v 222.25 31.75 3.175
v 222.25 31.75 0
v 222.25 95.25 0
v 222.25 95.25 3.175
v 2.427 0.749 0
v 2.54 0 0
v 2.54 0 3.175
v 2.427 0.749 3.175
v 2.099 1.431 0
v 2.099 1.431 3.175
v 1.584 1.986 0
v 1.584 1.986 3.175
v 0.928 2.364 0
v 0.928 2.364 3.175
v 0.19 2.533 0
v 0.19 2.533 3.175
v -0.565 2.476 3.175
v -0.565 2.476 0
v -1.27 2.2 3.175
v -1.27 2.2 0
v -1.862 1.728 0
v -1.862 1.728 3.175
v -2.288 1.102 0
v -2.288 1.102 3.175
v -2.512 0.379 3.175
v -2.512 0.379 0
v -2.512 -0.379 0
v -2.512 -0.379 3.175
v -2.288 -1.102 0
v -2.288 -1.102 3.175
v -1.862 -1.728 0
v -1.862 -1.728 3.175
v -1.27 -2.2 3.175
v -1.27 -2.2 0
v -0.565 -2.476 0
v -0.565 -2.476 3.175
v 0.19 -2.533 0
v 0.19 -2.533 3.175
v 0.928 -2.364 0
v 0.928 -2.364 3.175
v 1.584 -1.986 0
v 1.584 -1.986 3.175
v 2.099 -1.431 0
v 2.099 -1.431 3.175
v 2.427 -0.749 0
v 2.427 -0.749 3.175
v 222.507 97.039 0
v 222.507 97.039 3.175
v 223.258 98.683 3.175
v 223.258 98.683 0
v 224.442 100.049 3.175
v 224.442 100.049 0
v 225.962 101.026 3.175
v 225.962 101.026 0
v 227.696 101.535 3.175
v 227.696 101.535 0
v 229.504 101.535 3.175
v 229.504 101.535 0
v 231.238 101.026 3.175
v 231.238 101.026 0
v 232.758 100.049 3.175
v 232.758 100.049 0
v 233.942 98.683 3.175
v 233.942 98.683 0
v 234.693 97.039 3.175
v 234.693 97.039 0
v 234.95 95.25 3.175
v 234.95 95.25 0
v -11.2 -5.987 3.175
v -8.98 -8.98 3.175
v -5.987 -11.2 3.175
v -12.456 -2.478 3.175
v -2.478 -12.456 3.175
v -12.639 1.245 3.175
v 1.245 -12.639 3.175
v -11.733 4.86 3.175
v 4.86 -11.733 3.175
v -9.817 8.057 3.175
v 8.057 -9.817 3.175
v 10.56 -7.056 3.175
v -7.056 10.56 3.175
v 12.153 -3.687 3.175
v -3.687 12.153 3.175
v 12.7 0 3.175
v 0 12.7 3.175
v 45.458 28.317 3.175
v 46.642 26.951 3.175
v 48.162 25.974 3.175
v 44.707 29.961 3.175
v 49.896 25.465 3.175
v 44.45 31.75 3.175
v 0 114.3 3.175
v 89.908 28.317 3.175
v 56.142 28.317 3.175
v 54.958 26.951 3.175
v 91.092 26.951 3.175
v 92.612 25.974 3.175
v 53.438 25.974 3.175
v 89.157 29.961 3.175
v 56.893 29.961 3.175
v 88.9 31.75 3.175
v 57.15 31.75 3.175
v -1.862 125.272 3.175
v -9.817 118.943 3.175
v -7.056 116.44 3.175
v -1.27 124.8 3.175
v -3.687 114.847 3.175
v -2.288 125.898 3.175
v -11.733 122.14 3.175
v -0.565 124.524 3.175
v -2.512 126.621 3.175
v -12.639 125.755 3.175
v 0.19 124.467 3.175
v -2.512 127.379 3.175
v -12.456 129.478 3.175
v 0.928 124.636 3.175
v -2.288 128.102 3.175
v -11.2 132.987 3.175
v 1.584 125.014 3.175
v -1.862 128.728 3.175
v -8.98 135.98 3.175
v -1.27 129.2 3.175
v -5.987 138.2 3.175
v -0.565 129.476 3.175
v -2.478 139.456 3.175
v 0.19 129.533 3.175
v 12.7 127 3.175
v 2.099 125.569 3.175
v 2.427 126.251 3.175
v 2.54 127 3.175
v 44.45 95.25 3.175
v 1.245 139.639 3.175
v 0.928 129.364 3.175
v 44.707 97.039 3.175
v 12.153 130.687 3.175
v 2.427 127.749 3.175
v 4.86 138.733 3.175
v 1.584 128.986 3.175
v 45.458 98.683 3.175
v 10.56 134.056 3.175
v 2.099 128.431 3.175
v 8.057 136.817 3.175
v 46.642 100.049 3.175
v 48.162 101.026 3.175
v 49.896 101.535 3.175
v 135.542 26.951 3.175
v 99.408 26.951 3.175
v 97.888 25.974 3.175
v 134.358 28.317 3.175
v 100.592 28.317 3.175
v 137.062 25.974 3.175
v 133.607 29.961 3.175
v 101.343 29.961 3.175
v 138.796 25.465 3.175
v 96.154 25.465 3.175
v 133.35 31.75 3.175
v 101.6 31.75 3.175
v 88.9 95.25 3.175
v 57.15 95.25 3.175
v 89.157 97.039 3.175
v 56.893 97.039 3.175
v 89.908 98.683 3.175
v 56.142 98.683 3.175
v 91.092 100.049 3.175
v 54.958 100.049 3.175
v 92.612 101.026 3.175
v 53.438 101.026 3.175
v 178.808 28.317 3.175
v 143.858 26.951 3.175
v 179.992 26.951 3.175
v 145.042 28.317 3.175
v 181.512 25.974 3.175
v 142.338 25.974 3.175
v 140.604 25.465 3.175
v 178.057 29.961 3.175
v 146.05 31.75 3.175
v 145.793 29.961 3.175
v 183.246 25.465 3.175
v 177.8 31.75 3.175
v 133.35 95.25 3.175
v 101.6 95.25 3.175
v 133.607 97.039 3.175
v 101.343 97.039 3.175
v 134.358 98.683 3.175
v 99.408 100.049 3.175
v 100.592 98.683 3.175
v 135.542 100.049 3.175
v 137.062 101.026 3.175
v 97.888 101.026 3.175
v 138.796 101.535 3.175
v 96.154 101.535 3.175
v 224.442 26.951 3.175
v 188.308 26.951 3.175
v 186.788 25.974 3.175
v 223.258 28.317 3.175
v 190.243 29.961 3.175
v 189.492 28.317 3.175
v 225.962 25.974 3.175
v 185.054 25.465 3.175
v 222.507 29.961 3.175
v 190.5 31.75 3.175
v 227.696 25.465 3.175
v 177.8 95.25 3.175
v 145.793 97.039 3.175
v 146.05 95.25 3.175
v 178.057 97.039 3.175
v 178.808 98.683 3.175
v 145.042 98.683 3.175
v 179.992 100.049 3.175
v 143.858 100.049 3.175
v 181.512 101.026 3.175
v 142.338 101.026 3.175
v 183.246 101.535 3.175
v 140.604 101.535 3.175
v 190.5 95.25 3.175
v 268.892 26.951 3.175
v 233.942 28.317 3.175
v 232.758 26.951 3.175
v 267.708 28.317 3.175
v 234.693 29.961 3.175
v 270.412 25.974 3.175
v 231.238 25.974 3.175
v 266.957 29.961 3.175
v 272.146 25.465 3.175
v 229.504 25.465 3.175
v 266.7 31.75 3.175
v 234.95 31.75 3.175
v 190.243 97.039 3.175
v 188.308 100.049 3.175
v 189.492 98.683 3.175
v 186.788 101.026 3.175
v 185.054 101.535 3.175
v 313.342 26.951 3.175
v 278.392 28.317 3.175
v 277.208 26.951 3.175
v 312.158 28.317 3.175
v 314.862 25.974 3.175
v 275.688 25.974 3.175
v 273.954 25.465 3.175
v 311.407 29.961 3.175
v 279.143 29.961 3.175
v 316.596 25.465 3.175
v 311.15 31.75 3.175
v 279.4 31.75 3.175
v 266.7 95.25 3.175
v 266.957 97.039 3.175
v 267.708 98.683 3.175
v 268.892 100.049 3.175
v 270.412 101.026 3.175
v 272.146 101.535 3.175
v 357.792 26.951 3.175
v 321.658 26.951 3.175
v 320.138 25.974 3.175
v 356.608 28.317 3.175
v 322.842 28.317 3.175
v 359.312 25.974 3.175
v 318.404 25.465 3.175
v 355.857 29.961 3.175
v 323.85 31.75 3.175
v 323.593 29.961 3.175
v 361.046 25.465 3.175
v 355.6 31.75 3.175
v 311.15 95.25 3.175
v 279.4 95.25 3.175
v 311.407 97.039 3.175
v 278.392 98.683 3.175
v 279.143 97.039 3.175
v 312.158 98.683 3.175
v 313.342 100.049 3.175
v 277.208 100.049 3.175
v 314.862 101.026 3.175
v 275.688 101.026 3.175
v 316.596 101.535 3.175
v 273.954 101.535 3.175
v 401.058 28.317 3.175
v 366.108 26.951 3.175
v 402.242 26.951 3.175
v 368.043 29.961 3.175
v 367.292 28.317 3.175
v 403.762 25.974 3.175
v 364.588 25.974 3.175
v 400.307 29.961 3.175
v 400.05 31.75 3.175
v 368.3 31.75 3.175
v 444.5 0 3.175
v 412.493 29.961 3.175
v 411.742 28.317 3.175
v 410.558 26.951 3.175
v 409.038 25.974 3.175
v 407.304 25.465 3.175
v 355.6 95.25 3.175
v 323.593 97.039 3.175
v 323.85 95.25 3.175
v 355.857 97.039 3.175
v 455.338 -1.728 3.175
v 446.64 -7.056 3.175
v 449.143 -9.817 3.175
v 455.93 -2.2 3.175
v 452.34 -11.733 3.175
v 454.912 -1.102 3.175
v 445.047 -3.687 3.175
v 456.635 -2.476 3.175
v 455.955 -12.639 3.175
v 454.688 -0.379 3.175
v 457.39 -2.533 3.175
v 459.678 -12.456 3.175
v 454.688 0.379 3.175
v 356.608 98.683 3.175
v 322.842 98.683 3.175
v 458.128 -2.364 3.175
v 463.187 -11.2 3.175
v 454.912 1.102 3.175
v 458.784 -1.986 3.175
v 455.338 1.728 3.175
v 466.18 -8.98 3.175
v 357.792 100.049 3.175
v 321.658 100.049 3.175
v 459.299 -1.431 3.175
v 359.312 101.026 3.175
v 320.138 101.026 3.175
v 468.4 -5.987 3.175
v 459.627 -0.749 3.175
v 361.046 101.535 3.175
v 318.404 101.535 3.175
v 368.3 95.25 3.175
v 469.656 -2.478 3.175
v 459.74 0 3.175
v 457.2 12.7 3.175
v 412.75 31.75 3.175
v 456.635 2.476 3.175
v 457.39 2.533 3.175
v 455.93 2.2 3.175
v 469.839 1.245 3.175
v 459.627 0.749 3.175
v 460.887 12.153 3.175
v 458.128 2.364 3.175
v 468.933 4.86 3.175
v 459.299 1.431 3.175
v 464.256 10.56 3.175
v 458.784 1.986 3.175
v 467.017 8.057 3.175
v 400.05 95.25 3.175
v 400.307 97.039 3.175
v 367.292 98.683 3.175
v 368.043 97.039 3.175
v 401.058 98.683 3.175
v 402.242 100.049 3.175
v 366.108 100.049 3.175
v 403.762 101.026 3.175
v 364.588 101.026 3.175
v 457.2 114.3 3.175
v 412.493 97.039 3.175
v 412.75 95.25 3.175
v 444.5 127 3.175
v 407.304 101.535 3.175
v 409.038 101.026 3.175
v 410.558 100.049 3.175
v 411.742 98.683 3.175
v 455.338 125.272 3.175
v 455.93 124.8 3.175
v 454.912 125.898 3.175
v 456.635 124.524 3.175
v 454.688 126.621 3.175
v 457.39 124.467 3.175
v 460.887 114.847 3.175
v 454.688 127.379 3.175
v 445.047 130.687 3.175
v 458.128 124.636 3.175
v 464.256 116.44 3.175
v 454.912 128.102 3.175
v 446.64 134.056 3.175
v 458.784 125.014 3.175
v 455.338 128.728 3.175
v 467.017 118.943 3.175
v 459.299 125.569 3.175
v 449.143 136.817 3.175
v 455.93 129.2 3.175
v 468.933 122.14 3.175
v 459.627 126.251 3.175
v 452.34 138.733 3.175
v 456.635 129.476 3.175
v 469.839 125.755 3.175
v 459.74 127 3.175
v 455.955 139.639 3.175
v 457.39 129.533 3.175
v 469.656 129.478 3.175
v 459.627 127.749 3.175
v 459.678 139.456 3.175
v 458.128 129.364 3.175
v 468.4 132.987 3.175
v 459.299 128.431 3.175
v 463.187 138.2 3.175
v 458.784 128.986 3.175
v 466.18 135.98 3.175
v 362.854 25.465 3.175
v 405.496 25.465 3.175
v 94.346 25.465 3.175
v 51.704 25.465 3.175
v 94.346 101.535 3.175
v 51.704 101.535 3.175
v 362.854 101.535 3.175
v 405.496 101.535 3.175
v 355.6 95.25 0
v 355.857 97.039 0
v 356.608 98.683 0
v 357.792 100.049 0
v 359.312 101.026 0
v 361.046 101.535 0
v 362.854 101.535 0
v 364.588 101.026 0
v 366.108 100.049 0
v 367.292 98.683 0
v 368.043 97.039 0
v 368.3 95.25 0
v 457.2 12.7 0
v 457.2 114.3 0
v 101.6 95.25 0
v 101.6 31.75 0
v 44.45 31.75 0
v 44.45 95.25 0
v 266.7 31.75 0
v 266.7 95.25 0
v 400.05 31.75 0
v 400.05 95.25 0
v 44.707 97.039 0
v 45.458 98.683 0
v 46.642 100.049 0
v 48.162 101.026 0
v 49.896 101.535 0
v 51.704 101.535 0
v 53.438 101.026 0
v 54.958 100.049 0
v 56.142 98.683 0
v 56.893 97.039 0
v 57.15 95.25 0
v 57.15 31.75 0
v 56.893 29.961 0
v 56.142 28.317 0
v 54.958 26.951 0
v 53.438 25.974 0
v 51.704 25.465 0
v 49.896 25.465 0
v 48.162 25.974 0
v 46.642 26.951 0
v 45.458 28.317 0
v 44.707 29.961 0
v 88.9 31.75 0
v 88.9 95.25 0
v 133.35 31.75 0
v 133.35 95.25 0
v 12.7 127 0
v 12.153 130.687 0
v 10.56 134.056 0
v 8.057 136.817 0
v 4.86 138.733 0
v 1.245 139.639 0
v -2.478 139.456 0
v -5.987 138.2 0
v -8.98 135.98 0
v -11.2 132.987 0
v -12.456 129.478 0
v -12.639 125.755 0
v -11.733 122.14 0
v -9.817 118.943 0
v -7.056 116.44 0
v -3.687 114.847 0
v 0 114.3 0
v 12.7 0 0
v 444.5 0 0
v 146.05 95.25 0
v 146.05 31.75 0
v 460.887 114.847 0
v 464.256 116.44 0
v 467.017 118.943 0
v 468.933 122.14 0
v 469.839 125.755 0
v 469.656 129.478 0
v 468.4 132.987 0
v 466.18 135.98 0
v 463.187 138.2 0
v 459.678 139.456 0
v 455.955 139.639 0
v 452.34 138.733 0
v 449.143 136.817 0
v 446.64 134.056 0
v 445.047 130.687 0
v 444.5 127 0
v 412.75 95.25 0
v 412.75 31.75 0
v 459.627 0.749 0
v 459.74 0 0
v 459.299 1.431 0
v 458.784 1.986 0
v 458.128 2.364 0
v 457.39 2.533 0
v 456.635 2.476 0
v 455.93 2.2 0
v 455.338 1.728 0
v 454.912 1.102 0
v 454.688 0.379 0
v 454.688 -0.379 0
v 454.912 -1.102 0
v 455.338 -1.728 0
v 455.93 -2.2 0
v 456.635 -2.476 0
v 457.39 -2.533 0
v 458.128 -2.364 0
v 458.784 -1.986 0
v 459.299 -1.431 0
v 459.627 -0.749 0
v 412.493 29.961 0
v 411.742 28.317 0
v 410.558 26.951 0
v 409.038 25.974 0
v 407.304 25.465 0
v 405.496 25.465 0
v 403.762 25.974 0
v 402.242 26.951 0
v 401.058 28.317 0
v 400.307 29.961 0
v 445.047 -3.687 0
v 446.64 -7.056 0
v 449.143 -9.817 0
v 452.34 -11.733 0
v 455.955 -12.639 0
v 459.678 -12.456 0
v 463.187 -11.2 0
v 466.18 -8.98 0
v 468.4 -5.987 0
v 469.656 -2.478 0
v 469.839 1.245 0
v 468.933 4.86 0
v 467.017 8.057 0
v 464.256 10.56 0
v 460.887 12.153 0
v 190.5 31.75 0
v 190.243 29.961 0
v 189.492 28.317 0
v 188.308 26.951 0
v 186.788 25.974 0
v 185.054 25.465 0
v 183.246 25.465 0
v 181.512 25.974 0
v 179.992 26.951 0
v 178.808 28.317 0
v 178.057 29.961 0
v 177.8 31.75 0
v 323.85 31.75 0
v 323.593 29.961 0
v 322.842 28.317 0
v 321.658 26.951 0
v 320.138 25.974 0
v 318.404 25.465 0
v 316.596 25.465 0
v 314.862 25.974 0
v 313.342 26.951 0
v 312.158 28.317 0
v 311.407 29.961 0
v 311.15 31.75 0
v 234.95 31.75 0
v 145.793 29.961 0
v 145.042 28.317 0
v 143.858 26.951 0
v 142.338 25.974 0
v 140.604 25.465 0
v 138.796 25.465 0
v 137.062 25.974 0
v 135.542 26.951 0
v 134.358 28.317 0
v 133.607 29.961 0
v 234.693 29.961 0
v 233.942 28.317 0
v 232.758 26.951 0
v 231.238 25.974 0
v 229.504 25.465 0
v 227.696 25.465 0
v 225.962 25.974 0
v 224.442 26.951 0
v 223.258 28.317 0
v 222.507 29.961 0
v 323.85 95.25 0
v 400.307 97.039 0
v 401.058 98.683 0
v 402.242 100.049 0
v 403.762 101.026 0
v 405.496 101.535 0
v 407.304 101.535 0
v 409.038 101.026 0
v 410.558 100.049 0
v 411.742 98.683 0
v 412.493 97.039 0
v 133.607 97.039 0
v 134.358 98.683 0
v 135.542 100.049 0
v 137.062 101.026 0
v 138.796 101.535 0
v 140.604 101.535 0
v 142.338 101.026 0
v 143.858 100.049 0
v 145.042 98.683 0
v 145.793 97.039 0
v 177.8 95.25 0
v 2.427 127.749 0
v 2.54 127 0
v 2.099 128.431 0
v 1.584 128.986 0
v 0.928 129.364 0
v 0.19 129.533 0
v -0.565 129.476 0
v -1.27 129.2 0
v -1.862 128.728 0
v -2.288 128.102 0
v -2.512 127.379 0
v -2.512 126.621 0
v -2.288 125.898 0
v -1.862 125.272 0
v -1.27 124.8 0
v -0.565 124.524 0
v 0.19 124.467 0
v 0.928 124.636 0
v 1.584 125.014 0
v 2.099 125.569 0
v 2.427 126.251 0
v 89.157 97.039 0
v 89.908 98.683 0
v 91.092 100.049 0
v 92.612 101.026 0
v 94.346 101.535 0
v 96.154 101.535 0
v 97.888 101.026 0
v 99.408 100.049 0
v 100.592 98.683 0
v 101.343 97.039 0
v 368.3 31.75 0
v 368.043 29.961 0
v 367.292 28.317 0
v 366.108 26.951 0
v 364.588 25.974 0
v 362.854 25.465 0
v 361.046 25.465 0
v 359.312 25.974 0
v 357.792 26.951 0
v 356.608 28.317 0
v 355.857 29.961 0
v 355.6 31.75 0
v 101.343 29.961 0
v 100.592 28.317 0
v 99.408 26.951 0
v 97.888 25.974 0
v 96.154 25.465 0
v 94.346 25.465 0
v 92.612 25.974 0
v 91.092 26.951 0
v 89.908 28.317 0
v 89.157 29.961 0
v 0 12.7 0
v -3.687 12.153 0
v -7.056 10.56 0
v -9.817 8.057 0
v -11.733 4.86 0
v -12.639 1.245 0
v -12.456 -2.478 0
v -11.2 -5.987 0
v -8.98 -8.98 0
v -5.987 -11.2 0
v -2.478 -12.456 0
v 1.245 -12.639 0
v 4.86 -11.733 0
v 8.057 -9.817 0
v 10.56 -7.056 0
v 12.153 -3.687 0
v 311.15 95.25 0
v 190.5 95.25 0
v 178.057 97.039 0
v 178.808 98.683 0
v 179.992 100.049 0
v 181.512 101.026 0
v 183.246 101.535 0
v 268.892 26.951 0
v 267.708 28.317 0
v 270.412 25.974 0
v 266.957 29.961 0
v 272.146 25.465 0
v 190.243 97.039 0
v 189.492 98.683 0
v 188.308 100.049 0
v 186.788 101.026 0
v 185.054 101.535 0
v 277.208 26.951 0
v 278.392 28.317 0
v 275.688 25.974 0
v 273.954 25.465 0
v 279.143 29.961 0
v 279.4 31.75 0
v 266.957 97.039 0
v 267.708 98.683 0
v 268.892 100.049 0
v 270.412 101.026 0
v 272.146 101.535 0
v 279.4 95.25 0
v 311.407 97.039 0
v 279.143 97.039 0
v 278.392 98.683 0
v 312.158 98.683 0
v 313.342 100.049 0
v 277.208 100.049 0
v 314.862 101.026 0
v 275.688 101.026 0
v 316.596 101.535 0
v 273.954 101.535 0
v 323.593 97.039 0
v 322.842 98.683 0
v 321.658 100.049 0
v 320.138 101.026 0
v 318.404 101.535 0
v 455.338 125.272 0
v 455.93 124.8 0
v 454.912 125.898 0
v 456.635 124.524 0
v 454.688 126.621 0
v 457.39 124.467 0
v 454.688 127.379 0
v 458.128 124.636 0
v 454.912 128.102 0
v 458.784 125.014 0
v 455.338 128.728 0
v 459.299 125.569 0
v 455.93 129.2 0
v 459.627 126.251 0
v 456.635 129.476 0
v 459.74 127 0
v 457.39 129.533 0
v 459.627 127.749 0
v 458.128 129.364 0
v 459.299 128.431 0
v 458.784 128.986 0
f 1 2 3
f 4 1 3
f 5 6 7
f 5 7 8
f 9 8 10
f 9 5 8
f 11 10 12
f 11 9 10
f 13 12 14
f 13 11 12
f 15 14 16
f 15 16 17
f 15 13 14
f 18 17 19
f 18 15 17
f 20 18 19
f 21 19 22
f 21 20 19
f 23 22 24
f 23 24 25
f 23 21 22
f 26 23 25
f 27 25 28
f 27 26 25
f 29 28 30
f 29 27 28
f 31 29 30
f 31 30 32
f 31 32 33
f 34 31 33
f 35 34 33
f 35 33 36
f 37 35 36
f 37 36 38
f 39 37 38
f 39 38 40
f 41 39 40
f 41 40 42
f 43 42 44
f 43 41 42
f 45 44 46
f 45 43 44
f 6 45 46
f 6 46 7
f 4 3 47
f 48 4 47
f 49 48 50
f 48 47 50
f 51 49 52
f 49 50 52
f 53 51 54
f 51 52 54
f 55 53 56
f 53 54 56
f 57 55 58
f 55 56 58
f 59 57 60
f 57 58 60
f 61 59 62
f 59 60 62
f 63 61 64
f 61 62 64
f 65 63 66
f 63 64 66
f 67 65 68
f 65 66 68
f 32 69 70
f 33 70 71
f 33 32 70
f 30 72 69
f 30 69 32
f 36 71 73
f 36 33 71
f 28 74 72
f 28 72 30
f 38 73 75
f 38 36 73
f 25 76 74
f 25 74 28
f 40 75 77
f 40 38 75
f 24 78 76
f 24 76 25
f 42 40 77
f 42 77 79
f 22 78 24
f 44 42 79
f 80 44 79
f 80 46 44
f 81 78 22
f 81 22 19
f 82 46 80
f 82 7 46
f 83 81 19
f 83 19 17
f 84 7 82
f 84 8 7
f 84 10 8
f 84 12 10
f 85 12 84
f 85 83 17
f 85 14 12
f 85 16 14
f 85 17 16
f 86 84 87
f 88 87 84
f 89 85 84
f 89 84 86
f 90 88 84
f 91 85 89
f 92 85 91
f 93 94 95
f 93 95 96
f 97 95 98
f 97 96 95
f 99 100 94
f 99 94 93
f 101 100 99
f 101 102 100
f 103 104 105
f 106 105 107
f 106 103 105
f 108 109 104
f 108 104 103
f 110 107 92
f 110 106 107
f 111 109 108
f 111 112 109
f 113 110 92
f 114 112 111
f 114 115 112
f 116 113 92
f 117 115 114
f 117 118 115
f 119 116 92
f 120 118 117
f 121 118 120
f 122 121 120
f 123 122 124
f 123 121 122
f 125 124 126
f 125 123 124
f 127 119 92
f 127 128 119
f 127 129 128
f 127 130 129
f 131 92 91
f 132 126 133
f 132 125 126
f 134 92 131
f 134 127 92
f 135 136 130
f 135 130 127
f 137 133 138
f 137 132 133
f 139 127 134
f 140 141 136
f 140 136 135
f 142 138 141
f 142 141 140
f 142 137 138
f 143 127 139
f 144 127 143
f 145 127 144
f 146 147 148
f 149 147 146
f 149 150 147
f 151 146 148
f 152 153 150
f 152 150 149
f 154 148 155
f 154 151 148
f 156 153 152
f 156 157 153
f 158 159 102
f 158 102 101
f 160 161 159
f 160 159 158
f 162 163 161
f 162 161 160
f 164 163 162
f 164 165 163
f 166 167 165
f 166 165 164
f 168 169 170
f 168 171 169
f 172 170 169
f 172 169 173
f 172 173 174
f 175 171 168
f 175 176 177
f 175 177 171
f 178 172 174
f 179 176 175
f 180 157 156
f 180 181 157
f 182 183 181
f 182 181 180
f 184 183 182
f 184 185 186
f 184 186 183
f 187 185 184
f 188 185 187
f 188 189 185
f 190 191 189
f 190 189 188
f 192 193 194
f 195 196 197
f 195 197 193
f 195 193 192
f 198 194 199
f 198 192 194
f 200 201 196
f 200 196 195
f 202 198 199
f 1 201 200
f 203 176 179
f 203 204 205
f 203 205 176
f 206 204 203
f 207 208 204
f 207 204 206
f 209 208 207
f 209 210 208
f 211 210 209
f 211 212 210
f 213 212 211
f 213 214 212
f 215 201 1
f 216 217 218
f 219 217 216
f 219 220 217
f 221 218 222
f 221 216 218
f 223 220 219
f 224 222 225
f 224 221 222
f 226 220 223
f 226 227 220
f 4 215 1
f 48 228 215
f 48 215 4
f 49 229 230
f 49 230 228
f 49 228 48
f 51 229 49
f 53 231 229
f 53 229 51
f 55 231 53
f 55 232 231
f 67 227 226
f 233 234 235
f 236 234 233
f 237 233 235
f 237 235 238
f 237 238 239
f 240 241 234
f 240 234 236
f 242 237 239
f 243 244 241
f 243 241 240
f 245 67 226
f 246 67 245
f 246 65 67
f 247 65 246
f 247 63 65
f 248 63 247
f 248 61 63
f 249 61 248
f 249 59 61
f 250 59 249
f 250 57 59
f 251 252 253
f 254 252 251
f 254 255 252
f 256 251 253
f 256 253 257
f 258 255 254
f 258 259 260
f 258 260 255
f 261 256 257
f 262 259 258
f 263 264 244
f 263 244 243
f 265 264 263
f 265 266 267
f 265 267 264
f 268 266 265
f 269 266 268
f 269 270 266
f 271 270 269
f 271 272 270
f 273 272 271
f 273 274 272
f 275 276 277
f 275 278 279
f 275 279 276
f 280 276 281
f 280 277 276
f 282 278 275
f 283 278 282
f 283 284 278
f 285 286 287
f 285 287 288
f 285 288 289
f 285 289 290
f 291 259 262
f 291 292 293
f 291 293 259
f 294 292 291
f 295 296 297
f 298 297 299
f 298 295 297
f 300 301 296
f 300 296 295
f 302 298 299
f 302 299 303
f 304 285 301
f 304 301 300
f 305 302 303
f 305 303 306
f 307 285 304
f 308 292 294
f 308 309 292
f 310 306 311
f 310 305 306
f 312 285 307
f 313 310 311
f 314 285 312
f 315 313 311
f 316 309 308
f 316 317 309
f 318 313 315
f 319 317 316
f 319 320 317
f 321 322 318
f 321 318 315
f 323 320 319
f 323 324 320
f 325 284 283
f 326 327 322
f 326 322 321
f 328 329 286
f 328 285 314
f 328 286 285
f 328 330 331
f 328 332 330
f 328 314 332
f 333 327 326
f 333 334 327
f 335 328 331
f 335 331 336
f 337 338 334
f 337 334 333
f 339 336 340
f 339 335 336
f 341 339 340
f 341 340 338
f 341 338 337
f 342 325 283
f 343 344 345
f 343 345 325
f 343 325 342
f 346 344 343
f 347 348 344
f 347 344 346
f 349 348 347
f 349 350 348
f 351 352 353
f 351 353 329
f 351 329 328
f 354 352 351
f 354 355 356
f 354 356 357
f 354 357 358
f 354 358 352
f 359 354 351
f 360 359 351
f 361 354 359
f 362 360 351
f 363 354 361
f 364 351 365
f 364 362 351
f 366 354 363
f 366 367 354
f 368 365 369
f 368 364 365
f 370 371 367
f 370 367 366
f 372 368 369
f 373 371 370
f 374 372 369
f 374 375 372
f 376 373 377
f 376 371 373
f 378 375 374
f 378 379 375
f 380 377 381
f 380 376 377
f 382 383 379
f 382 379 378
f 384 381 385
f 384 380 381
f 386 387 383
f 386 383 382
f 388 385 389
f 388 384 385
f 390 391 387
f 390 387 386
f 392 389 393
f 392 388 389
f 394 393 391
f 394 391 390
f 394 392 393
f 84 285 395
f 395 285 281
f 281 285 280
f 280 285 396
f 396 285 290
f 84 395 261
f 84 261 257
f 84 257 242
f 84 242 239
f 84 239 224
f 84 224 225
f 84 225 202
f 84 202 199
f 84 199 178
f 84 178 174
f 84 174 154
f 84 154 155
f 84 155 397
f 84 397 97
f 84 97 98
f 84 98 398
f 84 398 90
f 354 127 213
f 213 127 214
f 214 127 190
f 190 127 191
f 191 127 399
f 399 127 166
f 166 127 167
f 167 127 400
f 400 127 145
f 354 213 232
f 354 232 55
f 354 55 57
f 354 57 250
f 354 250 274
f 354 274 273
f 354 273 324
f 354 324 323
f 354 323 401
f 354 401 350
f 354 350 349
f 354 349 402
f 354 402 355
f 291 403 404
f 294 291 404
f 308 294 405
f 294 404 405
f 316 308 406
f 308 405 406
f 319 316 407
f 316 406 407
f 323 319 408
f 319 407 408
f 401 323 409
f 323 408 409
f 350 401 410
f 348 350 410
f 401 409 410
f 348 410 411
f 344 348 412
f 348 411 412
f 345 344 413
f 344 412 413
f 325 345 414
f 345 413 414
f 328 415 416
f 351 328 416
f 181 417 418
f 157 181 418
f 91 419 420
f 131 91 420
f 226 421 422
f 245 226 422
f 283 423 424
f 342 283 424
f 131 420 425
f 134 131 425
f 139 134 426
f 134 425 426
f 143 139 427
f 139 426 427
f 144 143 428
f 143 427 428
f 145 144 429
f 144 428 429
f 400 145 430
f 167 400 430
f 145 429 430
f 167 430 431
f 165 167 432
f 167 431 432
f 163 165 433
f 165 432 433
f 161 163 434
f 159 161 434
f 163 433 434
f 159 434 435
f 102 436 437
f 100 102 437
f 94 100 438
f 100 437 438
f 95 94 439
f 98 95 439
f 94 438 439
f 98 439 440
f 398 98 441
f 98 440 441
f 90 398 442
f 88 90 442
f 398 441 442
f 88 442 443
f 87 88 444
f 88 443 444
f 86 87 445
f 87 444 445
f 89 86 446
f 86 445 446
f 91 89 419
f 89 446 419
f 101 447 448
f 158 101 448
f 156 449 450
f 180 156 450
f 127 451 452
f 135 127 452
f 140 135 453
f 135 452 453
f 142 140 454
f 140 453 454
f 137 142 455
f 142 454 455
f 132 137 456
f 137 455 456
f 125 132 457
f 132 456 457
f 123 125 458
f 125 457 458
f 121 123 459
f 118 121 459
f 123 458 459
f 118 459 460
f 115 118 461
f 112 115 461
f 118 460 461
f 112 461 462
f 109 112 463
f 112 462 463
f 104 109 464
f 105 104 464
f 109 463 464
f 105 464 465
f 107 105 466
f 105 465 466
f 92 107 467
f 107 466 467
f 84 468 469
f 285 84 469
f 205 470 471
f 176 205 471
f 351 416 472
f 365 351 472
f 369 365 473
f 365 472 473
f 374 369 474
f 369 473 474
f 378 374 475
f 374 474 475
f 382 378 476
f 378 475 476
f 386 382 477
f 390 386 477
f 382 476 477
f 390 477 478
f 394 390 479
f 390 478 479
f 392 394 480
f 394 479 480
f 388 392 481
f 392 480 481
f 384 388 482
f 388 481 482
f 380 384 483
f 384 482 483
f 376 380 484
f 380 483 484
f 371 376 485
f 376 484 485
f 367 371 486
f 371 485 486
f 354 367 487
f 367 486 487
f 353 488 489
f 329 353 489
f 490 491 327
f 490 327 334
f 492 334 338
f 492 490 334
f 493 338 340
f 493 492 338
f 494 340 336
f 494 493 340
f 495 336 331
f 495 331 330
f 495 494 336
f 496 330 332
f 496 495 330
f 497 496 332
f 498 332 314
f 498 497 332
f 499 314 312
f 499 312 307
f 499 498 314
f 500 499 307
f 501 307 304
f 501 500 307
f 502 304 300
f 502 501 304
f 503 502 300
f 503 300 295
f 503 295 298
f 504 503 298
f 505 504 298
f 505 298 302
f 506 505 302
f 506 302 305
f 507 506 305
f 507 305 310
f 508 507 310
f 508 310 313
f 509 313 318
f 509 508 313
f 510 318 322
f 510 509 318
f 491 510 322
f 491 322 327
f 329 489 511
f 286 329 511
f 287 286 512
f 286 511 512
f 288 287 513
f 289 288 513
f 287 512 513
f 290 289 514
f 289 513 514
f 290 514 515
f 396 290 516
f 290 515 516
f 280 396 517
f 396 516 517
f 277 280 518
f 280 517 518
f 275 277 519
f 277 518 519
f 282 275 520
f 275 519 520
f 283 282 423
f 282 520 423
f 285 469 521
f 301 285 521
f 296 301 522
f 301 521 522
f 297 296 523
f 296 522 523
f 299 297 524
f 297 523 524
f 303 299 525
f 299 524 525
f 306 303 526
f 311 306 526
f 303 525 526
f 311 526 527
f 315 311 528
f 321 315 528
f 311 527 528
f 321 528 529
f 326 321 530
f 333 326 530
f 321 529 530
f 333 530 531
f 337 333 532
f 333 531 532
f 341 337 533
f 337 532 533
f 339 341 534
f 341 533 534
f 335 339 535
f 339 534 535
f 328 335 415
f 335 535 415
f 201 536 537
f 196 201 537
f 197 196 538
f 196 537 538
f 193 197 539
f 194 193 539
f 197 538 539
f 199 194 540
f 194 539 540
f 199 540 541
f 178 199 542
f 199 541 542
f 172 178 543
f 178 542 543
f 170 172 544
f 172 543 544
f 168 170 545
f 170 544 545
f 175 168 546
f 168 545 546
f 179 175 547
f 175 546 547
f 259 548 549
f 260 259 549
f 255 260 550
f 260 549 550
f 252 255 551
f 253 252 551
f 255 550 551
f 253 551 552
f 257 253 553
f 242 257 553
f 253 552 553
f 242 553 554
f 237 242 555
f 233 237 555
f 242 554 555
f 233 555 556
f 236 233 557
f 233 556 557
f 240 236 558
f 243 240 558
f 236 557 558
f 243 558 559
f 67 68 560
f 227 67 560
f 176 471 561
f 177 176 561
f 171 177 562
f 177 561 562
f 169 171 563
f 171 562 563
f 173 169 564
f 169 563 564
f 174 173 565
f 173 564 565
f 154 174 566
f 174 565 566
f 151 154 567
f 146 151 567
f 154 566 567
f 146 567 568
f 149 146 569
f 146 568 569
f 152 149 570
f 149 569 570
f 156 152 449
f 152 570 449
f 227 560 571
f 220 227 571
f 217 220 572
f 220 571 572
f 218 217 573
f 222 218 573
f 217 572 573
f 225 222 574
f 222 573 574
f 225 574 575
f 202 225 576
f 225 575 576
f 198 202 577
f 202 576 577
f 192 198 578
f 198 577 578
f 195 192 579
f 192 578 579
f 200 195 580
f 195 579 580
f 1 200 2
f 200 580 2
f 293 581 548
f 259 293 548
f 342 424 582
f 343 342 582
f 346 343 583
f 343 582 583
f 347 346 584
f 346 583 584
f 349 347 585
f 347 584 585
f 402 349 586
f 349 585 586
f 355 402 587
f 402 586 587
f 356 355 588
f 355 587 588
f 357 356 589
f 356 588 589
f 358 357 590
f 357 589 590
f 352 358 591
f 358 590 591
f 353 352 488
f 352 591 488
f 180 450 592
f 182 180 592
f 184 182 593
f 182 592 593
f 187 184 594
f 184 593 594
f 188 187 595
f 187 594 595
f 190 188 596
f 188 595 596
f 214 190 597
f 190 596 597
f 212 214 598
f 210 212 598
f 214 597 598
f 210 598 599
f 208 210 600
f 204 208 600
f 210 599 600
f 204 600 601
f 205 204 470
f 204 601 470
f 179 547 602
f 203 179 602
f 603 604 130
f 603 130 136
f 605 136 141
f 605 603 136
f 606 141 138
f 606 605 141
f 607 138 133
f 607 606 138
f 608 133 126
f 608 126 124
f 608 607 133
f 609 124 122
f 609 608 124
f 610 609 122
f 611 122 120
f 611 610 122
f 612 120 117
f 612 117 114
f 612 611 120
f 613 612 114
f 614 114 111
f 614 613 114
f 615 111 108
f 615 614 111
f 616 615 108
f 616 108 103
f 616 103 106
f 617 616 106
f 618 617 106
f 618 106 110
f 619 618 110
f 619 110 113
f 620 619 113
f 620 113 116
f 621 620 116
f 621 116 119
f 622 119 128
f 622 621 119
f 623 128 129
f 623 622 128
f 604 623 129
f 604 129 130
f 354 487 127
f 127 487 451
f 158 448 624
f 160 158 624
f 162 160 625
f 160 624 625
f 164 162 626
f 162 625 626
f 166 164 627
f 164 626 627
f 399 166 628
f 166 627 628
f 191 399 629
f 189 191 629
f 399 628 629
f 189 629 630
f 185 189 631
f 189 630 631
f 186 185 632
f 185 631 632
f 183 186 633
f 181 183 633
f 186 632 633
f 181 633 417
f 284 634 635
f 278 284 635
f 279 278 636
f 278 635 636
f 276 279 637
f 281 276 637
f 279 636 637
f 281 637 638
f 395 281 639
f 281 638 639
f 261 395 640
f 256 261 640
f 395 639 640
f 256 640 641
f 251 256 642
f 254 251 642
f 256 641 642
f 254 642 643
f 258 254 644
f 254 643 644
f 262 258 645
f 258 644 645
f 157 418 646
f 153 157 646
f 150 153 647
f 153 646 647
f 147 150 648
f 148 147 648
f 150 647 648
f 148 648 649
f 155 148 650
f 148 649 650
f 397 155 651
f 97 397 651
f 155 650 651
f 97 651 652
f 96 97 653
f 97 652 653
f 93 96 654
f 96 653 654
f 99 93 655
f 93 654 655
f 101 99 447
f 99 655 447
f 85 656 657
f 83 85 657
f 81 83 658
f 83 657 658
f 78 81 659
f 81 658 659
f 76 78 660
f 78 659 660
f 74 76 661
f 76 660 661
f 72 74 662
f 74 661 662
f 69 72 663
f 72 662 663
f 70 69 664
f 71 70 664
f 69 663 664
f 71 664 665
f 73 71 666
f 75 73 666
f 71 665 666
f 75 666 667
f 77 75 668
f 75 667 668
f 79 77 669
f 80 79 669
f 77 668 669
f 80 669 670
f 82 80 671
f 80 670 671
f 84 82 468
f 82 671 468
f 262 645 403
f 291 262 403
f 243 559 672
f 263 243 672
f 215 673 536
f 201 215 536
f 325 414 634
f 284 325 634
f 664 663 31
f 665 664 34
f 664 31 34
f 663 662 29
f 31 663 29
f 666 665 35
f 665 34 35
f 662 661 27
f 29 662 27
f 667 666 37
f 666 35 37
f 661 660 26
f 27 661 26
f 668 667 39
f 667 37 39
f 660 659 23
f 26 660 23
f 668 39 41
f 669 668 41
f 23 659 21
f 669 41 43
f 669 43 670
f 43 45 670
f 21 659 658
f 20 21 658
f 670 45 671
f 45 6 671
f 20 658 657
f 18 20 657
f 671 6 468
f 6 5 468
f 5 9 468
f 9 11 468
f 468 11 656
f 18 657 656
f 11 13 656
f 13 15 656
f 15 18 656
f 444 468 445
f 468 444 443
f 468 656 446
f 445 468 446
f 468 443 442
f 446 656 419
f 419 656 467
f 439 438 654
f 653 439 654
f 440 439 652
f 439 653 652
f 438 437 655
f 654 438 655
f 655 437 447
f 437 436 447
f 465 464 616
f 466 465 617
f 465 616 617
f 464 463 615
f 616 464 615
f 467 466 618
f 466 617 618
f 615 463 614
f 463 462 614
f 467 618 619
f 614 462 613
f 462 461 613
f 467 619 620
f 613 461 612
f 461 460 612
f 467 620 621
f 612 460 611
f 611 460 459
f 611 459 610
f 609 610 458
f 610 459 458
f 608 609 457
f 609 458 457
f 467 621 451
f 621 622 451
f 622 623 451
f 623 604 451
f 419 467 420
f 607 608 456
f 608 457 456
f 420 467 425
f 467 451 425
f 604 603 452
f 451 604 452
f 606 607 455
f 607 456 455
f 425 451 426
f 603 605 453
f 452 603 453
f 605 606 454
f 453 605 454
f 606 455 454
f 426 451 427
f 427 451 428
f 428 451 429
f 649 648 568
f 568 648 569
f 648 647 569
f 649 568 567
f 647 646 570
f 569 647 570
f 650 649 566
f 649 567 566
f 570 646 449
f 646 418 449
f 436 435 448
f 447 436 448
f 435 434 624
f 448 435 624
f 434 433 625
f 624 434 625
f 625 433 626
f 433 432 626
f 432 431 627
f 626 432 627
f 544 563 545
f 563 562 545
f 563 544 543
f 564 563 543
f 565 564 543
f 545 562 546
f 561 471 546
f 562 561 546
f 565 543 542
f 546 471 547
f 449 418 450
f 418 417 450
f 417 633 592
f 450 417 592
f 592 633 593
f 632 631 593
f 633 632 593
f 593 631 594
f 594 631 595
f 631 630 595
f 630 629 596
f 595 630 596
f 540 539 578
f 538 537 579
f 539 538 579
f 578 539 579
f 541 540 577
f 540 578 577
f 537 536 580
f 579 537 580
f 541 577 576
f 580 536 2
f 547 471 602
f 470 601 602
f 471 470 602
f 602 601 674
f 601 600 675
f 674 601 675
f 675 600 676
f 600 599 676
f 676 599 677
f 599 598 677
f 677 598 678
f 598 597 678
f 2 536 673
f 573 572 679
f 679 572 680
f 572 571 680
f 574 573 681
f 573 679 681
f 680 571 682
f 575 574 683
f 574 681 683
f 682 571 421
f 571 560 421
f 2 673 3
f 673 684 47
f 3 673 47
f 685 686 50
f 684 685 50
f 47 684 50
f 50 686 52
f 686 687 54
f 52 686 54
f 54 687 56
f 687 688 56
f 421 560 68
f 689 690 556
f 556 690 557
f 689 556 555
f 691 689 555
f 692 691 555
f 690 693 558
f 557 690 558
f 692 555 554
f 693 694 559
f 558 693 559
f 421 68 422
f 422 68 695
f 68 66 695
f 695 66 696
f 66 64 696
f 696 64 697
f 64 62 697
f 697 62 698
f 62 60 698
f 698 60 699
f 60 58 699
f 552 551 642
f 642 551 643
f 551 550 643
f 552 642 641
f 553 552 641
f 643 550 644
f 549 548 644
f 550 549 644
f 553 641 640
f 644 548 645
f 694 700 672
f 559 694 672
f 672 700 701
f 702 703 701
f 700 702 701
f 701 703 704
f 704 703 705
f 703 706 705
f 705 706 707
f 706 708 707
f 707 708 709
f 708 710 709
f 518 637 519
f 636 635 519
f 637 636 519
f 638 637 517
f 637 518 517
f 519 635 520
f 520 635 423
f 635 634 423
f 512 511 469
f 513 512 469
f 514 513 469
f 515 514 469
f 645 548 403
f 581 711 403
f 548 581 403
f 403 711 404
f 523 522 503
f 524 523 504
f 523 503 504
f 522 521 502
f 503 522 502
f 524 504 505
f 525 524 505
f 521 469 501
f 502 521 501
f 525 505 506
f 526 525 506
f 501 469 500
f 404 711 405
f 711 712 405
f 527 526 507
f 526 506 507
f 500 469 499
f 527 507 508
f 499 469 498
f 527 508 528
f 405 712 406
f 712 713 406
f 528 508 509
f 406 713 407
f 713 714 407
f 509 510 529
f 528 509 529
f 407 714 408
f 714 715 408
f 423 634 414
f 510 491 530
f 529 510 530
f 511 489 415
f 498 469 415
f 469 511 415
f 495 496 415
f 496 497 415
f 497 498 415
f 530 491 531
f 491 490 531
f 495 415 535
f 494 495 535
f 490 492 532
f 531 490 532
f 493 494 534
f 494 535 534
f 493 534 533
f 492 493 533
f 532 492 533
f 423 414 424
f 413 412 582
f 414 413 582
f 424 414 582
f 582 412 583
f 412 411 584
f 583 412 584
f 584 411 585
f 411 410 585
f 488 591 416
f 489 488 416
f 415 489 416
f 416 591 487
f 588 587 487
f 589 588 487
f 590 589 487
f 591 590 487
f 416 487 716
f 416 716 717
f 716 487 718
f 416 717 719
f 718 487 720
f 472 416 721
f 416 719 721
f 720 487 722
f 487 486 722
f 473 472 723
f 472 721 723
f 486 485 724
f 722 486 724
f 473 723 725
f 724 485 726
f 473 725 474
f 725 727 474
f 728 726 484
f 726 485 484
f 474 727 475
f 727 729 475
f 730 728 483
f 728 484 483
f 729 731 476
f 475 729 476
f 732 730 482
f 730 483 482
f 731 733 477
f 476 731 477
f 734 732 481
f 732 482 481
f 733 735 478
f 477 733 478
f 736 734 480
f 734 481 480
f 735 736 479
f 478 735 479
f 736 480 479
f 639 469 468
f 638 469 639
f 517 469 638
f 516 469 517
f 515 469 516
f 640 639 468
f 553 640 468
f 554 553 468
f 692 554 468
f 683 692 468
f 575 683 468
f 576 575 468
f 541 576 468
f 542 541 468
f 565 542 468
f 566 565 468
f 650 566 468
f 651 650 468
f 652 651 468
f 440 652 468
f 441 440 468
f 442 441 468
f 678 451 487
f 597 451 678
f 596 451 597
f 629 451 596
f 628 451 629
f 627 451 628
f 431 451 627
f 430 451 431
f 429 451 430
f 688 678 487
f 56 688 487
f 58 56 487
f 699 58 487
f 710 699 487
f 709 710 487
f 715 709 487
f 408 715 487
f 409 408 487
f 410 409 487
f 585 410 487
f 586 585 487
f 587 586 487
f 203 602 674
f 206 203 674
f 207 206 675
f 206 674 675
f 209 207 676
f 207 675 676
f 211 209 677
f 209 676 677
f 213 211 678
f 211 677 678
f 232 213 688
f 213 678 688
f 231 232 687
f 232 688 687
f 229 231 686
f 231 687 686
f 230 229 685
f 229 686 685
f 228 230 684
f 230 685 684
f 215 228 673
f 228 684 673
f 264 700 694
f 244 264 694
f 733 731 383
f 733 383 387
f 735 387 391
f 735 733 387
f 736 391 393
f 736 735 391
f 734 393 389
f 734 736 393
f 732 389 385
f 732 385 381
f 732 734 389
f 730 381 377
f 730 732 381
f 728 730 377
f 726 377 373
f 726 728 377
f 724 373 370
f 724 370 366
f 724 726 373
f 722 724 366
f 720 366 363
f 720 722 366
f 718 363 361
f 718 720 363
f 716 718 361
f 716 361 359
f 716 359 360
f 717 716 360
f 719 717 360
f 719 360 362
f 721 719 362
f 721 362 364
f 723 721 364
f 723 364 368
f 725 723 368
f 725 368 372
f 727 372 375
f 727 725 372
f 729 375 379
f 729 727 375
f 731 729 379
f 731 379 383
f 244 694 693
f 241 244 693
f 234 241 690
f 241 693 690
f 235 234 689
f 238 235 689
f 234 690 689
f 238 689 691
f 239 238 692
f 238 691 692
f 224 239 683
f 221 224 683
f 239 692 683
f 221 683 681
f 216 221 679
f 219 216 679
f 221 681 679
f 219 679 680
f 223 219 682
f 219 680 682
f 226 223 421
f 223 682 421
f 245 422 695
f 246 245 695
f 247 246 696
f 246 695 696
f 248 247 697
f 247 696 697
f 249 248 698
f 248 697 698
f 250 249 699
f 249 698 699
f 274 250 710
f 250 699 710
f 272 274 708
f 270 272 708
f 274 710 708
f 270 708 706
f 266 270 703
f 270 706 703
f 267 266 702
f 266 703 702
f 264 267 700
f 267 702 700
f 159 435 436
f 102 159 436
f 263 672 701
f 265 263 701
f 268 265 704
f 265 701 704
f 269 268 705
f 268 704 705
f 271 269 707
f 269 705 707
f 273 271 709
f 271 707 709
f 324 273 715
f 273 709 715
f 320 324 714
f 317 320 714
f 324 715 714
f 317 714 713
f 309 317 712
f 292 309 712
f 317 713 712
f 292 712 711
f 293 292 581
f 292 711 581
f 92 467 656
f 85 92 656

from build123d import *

# Parameters (mm, degrees)
F0_R     = 2.54
F1_DEPTH = 3.175


with BuildPart() as f1:
    # F0 (on Top) → F1 (new body)
    with BuildSketch(Plane.XY):
        with BuildLine():
            ThreePointArc((0, 12.7), (-8.980256, -8.980256), (12.7, 0))
            Line((12.7, 0), (444.5, 0))
            ThreePointArc((444.5, 0), (466.180256, -8.980256), (457.2, 12.7))
            Line((457.2, 12.7), (457.2, 114.3))
            ThreePointArc((457.2, 114.3), (466.180256, 135.980256), (444.5, 127))
            Line((444.5, 127), (12.7, 127))
            ThreePointArc((12.7, 127), (-8.980256, 135.980256), (0, 114.3))
            Line((0, 114.3), (0, 12.7))
        make_face()
        Circle(F0_R, mode=Mode.SUBTRACT)
        with BuildLine():
            Line((57.15, 95.25), (57.15, 31.75))
            ThreePointArc((57.15, 31.75), (50.8, 25.4), (44.45, 31.75))
            Line((44.45, 31.75), (44.45, 95.25))
            ThreePointArc((44.45, 95.25), (50.8, 101.6), (57.15, 95.25))
        make_face(mode=Mode.SUBTRACT)
        with BuildLine():
            Line((88.9, 31.75), (88.9, 95.25))
            ThreePointArc((88.9, 95.25), (95.25, 101.6), (101.6, 95.25))
            Line((101.6, 95.25), (101.6, 31.75))
            ThreePointArc((101.6, 31.75), (95.25, 25.4), (88.9, 31.75))
        make_face(mode=Mode.SUBTRACT)
        with BuildLine():
            Line((133.35, 31.75), (133.35, 95.25))
            ThreePointArc((133.35, 95.25), (139.7, 101.6), (146.05, 95.25))
            Line((146.05, 95.25), (146.05, 31.75))
            ThreePointArc((146.05, 31.75), (139.7, 25.4), (133.35, 31.75))
        make_face(mode=Mode.SUBTRACT)
        with BuildLine():
            Line((177.8, 31.75), (177.8, 95.25))
            ThreePointArc((177.8, 95.25), (184.15, 101.6), (190.5, 95.25))
            Line((190.5, 95.25), (190.5, 31.75))
            ThreePointArc((190.5, 31.75), (184.15, 25.4), (177.8, 31.75))
        make_face(mode=Mode.SUBTRACT)
        with Locations((457.2, 0)):
            Circle(F0_R, mode=Mode.SUBTRACT)
        with BuildLine():
            Line((222.25, 31.75), (222.25, 95.25))
            ThreePointArc((222.25, 95.25), (228.6, 101.6), (234.95, 95.25))
            Line((234.95, 95.25), (234.95, 31.75))
            ThreePointArc((234.95, 31.75), (228.6, 25.4), (222.25, 31.75))
        make_face(mode=Mode.SUBTRACT)
        with BuildLine():
            Line((266.7, 31.75), (266.7, 95.25))
            ThreePointArc((266.7, 95.25), (273.05, 101.6), (279.4, 95.25))
            Line((279.4, 95.25), (279.4, 31.75))
            ThreePointArc((279.4, 31.75), (273.05, 25.4), (266.7, 31.75))
        make_face(mode=Mode.SUBTRACT)
        with BuildLine():
            Line((311.15, 31.75), (311.15, 95.25))
            ThreePointArc((311.15, 95.25), (317.5, 101.6), (323.85, 95.25))
            Line((323.85, 95.25), (323.85, 31.75))
            ThreePointArc((323.85, 31.75), (317.5, 25.4), (311.15, 31.75))
        make_face(mode=Mode.SUBTRACT)
        with BuildLine():
            Line((355.6, 31.75), (355.6, 95.25))
            ThreePointArc((355.6, 95.25), (361.95, 101.6), (368.3, 95.25))
            Line((368.3, 95.25), (368.3, 31.75))
            ThreePointArc((368.3, 31.75), (361.95, 25.4), (355.6, 31.75))
        make_face(mode=Mode.SUBTRACT)
        with BuildLine():
            Line((400.05, 31.75), (400.05, 95.25))
            ThreePointArc((400.05, 95.25), (406.4, 101.6), (412.75, 95.25))
            Line((412.75, 95.25), (412.75, 31.75))
            ThreePointArc((412.75, 31.75), (406.4, 25.4), (400.05, 31.75))
        make_face(mode=Mode.SUBTRACT)
        with Locations((0, 127)):
            Circle(F0_R, mode=Mode.SUBTRACT)
        with Locations((457.2, 127)):
            Circle(F0_R, mode=Mode.SUBTRACT)
    extrude(amount=F1_DEPTH)


solid = f1.part
